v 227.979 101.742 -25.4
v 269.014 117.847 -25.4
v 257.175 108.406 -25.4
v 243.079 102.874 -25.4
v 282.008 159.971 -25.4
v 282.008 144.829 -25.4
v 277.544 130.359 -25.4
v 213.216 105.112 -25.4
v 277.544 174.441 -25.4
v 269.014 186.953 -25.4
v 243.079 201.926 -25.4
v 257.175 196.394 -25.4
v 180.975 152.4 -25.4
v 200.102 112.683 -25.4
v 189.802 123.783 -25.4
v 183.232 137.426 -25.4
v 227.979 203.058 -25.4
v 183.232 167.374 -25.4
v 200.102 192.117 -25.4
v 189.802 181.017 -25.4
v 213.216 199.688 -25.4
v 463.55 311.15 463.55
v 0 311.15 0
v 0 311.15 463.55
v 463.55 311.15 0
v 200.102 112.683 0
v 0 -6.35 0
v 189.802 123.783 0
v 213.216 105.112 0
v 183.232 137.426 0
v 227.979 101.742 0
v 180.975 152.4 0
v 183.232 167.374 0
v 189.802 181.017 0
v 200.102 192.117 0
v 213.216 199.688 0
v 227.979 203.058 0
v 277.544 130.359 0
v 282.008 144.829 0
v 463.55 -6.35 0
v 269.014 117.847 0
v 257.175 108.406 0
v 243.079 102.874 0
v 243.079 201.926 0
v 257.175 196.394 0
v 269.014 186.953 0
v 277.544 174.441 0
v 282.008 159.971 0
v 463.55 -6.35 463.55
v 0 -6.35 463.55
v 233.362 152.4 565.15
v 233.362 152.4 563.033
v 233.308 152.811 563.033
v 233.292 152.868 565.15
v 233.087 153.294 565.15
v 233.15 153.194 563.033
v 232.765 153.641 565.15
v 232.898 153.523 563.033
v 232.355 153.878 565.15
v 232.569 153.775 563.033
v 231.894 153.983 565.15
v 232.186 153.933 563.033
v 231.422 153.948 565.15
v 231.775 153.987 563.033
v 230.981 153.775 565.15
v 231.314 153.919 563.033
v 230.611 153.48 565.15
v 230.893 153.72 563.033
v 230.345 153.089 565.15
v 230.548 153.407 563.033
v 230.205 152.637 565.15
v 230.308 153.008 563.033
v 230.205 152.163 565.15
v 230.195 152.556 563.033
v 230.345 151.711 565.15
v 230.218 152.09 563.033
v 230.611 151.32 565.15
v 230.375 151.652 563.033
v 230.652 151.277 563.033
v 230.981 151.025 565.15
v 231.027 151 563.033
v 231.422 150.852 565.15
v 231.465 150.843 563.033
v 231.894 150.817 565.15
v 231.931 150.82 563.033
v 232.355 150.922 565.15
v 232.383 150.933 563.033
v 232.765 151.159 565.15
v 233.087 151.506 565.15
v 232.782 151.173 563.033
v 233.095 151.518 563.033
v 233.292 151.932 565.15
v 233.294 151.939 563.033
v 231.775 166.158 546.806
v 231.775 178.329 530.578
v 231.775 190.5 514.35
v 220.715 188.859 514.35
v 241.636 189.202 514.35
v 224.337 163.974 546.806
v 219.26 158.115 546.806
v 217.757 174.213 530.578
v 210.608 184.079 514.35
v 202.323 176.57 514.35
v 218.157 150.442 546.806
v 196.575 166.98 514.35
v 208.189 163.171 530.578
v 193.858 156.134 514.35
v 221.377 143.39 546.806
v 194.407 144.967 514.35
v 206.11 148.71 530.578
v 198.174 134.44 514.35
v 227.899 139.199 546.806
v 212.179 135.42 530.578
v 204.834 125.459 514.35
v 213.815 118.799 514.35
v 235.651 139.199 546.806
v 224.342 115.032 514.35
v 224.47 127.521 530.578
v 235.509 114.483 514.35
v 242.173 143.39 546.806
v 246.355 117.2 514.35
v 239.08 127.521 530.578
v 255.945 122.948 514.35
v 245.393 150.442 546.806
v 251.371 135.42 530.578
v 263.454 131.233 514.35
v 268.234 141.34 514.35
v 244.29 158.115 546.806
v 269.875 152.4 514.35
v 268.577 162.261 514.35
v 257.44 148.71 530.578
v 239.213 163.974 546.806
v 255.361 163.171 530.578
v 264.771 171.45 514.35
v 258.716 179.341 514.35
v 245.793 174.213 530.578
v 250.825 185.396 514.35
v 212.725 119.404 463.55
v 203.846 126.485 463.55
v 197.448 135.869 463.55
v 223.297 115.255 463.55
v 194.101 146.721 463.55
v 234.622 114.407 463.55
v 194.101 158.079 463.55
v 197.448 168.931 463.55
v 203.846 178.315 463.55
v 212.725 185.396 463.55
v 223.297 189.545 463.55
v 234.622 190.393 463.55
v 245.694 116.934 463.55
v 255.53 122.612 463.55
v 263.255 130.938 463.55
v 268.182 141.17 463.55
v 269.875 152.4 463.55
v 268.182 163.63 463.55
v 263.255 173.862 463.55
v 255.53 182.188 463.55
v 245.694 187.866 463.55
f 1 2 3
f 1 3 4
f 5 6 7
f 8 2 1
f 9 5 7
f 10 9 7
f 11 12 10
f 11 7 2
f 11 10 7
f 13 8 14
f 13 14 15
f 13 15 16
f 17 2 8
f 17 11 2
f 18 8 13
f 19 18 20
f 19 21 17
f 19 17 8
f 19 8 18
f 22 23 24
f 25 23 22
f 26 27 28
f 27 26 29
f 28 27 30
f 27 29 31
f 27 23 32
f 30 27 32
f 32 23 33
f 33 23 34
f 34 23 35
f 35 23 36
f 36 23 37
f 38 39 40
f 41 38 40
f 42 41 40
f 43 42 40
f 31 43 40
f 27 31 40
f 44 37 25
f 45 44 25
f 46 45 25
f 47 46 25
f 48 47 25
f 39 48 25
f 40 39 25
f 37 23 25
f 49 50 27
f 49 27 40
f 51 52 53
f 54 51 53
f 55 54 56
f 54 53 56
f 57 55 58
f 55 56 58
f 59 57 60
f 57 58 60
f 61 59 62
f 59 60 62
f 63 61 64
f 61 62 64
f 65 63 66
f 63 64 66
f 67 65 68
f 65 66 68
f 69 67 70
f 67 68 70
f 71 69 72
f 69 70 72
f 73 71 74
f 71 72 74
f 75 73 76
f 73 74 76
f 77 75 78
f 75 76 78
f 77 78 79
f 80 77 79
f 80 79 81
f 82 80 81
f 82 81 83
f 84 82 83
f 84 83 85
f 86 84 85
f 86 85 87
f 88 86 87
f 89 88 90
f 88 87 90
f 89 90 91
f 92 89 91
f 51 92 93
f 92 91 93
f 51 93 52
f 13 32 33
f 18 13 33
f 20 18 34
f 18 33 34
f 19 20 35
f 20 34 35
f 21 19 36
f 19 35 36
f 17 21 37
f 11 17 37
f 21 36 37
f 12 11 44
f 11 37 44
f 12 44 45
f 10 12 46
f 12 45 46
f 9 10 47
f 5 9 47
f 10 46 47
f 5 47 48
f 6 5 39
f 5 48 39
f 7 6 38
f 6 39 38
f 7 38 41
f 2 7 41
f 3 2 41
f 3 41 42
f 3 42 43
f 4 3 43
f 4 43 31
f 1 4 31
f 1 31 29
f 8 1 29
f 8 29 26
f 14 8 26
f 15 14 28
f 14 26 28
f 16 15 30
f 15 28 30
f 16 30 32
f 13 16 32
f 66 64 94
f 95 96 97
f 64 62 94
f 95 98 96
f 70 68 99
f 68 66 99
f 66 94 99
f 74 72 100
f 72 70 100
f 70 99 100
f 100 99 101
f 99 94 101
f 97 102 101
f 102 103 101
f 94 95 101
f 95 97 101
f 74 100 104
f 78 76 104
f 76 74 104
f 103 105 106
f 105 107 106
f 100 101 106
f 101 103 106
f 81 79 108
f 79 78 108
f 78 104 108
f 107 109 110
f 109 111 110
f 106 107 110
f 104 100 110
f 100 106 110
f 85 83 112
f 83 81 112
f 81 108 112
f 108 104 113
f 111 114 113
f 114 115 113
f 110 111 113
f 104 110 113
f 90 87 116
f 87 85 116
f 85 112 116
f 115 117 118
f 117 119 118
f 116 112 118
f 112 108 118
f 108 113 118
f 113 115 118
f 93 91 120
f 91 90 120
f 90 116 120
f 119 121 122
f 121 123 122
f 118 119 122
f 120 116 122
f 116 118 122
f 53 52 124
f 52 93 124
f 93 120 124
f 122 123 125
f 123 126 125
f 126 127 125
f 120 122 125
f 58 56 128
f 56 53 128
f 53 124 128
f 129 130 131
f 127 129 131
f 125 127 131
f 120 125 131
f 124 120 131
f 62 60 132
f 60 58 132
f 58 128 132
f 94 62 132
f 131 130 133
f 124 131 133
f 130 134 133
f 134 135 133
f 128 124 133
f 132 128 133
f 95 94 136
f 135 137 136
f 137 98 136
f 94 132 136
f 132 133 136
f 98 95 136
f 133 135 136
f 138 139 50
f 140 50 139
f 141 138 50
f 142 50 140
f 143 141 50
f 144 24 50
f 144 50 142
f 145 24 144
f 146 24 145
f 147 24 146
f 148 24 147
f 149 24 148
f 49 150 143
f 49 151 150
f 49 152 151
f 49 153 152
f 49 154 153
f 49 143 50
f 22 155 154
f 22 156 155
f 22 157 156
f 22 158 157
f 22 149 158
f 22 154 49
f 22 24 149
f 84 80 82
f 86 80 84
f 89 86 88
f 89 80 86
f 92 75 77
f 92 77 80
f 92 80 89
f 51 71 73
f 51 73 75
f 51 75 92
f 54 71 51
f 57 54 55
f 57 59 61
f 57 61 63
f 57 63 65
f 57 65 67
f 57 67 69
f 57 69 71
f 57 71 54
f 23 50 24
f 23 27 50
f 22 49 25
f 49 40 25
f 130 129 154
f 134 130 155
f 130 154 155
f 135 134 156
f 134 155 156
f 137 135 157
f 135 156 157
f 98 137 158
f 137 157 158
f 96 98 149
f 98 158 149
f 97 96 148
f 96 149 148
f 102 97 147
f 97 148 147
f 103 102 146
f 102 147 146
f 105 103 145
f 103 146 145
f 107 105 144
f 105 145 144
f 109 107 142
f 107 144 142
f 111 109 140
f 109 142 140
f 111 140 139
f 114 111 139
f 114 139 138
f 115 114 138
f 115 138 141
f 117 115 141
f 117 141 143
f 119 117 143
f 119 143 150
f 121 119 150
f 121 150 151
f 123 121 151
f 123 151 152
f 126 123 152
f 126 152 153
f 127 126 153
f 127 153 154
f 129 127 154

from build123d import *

# Parameters (mm, degrees)
SKETCH1_W           = 457.2
SKETCH1_H           = 304.8
CHAMBER_BASE_DEPTH  = 457.2
SKETCH2_W           = 457.2
SKETCH2_H           = 304.8
BACK_WALL_DEPTH     = 6.35
SKETCH3_W           = 463.55
SKETCH3_H           = 457.2
SIDE_WALL_2_DEPTH   = 6.35
SKETCH5_W           = 463.55
SKETCH5_H           = 457.2
SIDE_WALL_3_DEPTH   = 6.35
SKETCH8_W           = 463.55
SKETCH8_H           = 317.5
TOP_DEPTH           = 6.35
SKETCH9_R           = 38.1
BOSS_EXTRUDE1_DEPTH = 50.8
SKETCH10_R          = 50.8
BOSS_EXTRUDE2_DEPTH = 25.4
SKETCH11_R          = 1.5875
BOSS_EXTRUDE3_DEPTH = 50.8


with BuildPart() as part:
    # Sketch1 → Chamber Base (new body)
    with BuildSketch(Plane.XY):
        with Locations((228.6, 152.4)):
            Rectangle(SKETCH1_W, SKETCH1_H)
    extrude(amount=CHAMBER_BASE_DEPTH)

    # Sketch2 → Back wall (add)
    with BuildSketch(Plane(origin=(457.2, 0, 0), x_dir=(0, 0, -1), z_dir=(1, 0, 0))):
        with Locations((-228.6, 152.4)):
            Rectangle(SKETCH2_W, SKETCH2_H)
    extrude(amount=BACK_WALL_DEPTH)

    # Sketch3 → Side wall 2 (add)
    with BuildSketch(Plane(origin=(0, 304.8, 0), x_dir=(1, 0, 0), z_dir=(0, 1, 0))):
        with Locations((231.775, -228.6)):
            Rectangle(SKETCH3_W, SKETCH3_H)
    extrude(amount=SIDE_WALL_2_DEPTH)

    # Sketch5 → Side wall 3 (add)
    with BuildSketch(Plane.XZ):
        with Locations((231.775, 228.6)):
            Rectangle(SKETCH5_W, SKETCH5_H)
    extrude(amount=SIDE_WALL_3_DEPTH)

    # Sketch8 → Top (add)
    with BuildSketch(Plane.XY.offset(457.2)):
        with Locations((231.775, 152.4)):
            Rectangle(SKETCH8_W, SKETCH8_H)
    extrude(amount=TOP_DEPTH)

    # Sketch9 → Boss-Extrude1 (add)
    with BuildSketch(Plane.XY.offset(463.55)):
        with Locations((231.775, 152.4)):
            Circle(SKETCH9_R)
    extrude(amount=BOSS_EXTRUDE1_DEPTH)

    # Sketch10 → Boss-Extrude2 (add)
    with BuildSketch(Plane(origin=(0, 0, 0), x_dir=(-1, 0, 0), z_dir=(0, 0, -1))):
        with Locations((-231.775, 152.4)):
            Circle(SKETCH10_R)
    extrude(amount=BOSS_EXTRUDE2_DEPTH)

    # Sketch11 → Boss-Extrude3 (add)
    with BuildSketch(Plane.XY.offset(514.35)):
        with Locations((231.775, 152.4)):
            Circle(SKETCH11_R)
    extrude(amount=BOSS_EXTRUDE3_DEPTH)

    # Sketch15 → Revolve1 (revolve)
    with BuildSketch(Plane.ZY.offset(-231.775)):
        Polygon((514.35, 190.5), (514.35, 152.4), (565.15, 152.4), align=None)
    revolve(axis=Axis((231.775, 152.4, 514.35), (0, 0, 1)))


solid = part.part
